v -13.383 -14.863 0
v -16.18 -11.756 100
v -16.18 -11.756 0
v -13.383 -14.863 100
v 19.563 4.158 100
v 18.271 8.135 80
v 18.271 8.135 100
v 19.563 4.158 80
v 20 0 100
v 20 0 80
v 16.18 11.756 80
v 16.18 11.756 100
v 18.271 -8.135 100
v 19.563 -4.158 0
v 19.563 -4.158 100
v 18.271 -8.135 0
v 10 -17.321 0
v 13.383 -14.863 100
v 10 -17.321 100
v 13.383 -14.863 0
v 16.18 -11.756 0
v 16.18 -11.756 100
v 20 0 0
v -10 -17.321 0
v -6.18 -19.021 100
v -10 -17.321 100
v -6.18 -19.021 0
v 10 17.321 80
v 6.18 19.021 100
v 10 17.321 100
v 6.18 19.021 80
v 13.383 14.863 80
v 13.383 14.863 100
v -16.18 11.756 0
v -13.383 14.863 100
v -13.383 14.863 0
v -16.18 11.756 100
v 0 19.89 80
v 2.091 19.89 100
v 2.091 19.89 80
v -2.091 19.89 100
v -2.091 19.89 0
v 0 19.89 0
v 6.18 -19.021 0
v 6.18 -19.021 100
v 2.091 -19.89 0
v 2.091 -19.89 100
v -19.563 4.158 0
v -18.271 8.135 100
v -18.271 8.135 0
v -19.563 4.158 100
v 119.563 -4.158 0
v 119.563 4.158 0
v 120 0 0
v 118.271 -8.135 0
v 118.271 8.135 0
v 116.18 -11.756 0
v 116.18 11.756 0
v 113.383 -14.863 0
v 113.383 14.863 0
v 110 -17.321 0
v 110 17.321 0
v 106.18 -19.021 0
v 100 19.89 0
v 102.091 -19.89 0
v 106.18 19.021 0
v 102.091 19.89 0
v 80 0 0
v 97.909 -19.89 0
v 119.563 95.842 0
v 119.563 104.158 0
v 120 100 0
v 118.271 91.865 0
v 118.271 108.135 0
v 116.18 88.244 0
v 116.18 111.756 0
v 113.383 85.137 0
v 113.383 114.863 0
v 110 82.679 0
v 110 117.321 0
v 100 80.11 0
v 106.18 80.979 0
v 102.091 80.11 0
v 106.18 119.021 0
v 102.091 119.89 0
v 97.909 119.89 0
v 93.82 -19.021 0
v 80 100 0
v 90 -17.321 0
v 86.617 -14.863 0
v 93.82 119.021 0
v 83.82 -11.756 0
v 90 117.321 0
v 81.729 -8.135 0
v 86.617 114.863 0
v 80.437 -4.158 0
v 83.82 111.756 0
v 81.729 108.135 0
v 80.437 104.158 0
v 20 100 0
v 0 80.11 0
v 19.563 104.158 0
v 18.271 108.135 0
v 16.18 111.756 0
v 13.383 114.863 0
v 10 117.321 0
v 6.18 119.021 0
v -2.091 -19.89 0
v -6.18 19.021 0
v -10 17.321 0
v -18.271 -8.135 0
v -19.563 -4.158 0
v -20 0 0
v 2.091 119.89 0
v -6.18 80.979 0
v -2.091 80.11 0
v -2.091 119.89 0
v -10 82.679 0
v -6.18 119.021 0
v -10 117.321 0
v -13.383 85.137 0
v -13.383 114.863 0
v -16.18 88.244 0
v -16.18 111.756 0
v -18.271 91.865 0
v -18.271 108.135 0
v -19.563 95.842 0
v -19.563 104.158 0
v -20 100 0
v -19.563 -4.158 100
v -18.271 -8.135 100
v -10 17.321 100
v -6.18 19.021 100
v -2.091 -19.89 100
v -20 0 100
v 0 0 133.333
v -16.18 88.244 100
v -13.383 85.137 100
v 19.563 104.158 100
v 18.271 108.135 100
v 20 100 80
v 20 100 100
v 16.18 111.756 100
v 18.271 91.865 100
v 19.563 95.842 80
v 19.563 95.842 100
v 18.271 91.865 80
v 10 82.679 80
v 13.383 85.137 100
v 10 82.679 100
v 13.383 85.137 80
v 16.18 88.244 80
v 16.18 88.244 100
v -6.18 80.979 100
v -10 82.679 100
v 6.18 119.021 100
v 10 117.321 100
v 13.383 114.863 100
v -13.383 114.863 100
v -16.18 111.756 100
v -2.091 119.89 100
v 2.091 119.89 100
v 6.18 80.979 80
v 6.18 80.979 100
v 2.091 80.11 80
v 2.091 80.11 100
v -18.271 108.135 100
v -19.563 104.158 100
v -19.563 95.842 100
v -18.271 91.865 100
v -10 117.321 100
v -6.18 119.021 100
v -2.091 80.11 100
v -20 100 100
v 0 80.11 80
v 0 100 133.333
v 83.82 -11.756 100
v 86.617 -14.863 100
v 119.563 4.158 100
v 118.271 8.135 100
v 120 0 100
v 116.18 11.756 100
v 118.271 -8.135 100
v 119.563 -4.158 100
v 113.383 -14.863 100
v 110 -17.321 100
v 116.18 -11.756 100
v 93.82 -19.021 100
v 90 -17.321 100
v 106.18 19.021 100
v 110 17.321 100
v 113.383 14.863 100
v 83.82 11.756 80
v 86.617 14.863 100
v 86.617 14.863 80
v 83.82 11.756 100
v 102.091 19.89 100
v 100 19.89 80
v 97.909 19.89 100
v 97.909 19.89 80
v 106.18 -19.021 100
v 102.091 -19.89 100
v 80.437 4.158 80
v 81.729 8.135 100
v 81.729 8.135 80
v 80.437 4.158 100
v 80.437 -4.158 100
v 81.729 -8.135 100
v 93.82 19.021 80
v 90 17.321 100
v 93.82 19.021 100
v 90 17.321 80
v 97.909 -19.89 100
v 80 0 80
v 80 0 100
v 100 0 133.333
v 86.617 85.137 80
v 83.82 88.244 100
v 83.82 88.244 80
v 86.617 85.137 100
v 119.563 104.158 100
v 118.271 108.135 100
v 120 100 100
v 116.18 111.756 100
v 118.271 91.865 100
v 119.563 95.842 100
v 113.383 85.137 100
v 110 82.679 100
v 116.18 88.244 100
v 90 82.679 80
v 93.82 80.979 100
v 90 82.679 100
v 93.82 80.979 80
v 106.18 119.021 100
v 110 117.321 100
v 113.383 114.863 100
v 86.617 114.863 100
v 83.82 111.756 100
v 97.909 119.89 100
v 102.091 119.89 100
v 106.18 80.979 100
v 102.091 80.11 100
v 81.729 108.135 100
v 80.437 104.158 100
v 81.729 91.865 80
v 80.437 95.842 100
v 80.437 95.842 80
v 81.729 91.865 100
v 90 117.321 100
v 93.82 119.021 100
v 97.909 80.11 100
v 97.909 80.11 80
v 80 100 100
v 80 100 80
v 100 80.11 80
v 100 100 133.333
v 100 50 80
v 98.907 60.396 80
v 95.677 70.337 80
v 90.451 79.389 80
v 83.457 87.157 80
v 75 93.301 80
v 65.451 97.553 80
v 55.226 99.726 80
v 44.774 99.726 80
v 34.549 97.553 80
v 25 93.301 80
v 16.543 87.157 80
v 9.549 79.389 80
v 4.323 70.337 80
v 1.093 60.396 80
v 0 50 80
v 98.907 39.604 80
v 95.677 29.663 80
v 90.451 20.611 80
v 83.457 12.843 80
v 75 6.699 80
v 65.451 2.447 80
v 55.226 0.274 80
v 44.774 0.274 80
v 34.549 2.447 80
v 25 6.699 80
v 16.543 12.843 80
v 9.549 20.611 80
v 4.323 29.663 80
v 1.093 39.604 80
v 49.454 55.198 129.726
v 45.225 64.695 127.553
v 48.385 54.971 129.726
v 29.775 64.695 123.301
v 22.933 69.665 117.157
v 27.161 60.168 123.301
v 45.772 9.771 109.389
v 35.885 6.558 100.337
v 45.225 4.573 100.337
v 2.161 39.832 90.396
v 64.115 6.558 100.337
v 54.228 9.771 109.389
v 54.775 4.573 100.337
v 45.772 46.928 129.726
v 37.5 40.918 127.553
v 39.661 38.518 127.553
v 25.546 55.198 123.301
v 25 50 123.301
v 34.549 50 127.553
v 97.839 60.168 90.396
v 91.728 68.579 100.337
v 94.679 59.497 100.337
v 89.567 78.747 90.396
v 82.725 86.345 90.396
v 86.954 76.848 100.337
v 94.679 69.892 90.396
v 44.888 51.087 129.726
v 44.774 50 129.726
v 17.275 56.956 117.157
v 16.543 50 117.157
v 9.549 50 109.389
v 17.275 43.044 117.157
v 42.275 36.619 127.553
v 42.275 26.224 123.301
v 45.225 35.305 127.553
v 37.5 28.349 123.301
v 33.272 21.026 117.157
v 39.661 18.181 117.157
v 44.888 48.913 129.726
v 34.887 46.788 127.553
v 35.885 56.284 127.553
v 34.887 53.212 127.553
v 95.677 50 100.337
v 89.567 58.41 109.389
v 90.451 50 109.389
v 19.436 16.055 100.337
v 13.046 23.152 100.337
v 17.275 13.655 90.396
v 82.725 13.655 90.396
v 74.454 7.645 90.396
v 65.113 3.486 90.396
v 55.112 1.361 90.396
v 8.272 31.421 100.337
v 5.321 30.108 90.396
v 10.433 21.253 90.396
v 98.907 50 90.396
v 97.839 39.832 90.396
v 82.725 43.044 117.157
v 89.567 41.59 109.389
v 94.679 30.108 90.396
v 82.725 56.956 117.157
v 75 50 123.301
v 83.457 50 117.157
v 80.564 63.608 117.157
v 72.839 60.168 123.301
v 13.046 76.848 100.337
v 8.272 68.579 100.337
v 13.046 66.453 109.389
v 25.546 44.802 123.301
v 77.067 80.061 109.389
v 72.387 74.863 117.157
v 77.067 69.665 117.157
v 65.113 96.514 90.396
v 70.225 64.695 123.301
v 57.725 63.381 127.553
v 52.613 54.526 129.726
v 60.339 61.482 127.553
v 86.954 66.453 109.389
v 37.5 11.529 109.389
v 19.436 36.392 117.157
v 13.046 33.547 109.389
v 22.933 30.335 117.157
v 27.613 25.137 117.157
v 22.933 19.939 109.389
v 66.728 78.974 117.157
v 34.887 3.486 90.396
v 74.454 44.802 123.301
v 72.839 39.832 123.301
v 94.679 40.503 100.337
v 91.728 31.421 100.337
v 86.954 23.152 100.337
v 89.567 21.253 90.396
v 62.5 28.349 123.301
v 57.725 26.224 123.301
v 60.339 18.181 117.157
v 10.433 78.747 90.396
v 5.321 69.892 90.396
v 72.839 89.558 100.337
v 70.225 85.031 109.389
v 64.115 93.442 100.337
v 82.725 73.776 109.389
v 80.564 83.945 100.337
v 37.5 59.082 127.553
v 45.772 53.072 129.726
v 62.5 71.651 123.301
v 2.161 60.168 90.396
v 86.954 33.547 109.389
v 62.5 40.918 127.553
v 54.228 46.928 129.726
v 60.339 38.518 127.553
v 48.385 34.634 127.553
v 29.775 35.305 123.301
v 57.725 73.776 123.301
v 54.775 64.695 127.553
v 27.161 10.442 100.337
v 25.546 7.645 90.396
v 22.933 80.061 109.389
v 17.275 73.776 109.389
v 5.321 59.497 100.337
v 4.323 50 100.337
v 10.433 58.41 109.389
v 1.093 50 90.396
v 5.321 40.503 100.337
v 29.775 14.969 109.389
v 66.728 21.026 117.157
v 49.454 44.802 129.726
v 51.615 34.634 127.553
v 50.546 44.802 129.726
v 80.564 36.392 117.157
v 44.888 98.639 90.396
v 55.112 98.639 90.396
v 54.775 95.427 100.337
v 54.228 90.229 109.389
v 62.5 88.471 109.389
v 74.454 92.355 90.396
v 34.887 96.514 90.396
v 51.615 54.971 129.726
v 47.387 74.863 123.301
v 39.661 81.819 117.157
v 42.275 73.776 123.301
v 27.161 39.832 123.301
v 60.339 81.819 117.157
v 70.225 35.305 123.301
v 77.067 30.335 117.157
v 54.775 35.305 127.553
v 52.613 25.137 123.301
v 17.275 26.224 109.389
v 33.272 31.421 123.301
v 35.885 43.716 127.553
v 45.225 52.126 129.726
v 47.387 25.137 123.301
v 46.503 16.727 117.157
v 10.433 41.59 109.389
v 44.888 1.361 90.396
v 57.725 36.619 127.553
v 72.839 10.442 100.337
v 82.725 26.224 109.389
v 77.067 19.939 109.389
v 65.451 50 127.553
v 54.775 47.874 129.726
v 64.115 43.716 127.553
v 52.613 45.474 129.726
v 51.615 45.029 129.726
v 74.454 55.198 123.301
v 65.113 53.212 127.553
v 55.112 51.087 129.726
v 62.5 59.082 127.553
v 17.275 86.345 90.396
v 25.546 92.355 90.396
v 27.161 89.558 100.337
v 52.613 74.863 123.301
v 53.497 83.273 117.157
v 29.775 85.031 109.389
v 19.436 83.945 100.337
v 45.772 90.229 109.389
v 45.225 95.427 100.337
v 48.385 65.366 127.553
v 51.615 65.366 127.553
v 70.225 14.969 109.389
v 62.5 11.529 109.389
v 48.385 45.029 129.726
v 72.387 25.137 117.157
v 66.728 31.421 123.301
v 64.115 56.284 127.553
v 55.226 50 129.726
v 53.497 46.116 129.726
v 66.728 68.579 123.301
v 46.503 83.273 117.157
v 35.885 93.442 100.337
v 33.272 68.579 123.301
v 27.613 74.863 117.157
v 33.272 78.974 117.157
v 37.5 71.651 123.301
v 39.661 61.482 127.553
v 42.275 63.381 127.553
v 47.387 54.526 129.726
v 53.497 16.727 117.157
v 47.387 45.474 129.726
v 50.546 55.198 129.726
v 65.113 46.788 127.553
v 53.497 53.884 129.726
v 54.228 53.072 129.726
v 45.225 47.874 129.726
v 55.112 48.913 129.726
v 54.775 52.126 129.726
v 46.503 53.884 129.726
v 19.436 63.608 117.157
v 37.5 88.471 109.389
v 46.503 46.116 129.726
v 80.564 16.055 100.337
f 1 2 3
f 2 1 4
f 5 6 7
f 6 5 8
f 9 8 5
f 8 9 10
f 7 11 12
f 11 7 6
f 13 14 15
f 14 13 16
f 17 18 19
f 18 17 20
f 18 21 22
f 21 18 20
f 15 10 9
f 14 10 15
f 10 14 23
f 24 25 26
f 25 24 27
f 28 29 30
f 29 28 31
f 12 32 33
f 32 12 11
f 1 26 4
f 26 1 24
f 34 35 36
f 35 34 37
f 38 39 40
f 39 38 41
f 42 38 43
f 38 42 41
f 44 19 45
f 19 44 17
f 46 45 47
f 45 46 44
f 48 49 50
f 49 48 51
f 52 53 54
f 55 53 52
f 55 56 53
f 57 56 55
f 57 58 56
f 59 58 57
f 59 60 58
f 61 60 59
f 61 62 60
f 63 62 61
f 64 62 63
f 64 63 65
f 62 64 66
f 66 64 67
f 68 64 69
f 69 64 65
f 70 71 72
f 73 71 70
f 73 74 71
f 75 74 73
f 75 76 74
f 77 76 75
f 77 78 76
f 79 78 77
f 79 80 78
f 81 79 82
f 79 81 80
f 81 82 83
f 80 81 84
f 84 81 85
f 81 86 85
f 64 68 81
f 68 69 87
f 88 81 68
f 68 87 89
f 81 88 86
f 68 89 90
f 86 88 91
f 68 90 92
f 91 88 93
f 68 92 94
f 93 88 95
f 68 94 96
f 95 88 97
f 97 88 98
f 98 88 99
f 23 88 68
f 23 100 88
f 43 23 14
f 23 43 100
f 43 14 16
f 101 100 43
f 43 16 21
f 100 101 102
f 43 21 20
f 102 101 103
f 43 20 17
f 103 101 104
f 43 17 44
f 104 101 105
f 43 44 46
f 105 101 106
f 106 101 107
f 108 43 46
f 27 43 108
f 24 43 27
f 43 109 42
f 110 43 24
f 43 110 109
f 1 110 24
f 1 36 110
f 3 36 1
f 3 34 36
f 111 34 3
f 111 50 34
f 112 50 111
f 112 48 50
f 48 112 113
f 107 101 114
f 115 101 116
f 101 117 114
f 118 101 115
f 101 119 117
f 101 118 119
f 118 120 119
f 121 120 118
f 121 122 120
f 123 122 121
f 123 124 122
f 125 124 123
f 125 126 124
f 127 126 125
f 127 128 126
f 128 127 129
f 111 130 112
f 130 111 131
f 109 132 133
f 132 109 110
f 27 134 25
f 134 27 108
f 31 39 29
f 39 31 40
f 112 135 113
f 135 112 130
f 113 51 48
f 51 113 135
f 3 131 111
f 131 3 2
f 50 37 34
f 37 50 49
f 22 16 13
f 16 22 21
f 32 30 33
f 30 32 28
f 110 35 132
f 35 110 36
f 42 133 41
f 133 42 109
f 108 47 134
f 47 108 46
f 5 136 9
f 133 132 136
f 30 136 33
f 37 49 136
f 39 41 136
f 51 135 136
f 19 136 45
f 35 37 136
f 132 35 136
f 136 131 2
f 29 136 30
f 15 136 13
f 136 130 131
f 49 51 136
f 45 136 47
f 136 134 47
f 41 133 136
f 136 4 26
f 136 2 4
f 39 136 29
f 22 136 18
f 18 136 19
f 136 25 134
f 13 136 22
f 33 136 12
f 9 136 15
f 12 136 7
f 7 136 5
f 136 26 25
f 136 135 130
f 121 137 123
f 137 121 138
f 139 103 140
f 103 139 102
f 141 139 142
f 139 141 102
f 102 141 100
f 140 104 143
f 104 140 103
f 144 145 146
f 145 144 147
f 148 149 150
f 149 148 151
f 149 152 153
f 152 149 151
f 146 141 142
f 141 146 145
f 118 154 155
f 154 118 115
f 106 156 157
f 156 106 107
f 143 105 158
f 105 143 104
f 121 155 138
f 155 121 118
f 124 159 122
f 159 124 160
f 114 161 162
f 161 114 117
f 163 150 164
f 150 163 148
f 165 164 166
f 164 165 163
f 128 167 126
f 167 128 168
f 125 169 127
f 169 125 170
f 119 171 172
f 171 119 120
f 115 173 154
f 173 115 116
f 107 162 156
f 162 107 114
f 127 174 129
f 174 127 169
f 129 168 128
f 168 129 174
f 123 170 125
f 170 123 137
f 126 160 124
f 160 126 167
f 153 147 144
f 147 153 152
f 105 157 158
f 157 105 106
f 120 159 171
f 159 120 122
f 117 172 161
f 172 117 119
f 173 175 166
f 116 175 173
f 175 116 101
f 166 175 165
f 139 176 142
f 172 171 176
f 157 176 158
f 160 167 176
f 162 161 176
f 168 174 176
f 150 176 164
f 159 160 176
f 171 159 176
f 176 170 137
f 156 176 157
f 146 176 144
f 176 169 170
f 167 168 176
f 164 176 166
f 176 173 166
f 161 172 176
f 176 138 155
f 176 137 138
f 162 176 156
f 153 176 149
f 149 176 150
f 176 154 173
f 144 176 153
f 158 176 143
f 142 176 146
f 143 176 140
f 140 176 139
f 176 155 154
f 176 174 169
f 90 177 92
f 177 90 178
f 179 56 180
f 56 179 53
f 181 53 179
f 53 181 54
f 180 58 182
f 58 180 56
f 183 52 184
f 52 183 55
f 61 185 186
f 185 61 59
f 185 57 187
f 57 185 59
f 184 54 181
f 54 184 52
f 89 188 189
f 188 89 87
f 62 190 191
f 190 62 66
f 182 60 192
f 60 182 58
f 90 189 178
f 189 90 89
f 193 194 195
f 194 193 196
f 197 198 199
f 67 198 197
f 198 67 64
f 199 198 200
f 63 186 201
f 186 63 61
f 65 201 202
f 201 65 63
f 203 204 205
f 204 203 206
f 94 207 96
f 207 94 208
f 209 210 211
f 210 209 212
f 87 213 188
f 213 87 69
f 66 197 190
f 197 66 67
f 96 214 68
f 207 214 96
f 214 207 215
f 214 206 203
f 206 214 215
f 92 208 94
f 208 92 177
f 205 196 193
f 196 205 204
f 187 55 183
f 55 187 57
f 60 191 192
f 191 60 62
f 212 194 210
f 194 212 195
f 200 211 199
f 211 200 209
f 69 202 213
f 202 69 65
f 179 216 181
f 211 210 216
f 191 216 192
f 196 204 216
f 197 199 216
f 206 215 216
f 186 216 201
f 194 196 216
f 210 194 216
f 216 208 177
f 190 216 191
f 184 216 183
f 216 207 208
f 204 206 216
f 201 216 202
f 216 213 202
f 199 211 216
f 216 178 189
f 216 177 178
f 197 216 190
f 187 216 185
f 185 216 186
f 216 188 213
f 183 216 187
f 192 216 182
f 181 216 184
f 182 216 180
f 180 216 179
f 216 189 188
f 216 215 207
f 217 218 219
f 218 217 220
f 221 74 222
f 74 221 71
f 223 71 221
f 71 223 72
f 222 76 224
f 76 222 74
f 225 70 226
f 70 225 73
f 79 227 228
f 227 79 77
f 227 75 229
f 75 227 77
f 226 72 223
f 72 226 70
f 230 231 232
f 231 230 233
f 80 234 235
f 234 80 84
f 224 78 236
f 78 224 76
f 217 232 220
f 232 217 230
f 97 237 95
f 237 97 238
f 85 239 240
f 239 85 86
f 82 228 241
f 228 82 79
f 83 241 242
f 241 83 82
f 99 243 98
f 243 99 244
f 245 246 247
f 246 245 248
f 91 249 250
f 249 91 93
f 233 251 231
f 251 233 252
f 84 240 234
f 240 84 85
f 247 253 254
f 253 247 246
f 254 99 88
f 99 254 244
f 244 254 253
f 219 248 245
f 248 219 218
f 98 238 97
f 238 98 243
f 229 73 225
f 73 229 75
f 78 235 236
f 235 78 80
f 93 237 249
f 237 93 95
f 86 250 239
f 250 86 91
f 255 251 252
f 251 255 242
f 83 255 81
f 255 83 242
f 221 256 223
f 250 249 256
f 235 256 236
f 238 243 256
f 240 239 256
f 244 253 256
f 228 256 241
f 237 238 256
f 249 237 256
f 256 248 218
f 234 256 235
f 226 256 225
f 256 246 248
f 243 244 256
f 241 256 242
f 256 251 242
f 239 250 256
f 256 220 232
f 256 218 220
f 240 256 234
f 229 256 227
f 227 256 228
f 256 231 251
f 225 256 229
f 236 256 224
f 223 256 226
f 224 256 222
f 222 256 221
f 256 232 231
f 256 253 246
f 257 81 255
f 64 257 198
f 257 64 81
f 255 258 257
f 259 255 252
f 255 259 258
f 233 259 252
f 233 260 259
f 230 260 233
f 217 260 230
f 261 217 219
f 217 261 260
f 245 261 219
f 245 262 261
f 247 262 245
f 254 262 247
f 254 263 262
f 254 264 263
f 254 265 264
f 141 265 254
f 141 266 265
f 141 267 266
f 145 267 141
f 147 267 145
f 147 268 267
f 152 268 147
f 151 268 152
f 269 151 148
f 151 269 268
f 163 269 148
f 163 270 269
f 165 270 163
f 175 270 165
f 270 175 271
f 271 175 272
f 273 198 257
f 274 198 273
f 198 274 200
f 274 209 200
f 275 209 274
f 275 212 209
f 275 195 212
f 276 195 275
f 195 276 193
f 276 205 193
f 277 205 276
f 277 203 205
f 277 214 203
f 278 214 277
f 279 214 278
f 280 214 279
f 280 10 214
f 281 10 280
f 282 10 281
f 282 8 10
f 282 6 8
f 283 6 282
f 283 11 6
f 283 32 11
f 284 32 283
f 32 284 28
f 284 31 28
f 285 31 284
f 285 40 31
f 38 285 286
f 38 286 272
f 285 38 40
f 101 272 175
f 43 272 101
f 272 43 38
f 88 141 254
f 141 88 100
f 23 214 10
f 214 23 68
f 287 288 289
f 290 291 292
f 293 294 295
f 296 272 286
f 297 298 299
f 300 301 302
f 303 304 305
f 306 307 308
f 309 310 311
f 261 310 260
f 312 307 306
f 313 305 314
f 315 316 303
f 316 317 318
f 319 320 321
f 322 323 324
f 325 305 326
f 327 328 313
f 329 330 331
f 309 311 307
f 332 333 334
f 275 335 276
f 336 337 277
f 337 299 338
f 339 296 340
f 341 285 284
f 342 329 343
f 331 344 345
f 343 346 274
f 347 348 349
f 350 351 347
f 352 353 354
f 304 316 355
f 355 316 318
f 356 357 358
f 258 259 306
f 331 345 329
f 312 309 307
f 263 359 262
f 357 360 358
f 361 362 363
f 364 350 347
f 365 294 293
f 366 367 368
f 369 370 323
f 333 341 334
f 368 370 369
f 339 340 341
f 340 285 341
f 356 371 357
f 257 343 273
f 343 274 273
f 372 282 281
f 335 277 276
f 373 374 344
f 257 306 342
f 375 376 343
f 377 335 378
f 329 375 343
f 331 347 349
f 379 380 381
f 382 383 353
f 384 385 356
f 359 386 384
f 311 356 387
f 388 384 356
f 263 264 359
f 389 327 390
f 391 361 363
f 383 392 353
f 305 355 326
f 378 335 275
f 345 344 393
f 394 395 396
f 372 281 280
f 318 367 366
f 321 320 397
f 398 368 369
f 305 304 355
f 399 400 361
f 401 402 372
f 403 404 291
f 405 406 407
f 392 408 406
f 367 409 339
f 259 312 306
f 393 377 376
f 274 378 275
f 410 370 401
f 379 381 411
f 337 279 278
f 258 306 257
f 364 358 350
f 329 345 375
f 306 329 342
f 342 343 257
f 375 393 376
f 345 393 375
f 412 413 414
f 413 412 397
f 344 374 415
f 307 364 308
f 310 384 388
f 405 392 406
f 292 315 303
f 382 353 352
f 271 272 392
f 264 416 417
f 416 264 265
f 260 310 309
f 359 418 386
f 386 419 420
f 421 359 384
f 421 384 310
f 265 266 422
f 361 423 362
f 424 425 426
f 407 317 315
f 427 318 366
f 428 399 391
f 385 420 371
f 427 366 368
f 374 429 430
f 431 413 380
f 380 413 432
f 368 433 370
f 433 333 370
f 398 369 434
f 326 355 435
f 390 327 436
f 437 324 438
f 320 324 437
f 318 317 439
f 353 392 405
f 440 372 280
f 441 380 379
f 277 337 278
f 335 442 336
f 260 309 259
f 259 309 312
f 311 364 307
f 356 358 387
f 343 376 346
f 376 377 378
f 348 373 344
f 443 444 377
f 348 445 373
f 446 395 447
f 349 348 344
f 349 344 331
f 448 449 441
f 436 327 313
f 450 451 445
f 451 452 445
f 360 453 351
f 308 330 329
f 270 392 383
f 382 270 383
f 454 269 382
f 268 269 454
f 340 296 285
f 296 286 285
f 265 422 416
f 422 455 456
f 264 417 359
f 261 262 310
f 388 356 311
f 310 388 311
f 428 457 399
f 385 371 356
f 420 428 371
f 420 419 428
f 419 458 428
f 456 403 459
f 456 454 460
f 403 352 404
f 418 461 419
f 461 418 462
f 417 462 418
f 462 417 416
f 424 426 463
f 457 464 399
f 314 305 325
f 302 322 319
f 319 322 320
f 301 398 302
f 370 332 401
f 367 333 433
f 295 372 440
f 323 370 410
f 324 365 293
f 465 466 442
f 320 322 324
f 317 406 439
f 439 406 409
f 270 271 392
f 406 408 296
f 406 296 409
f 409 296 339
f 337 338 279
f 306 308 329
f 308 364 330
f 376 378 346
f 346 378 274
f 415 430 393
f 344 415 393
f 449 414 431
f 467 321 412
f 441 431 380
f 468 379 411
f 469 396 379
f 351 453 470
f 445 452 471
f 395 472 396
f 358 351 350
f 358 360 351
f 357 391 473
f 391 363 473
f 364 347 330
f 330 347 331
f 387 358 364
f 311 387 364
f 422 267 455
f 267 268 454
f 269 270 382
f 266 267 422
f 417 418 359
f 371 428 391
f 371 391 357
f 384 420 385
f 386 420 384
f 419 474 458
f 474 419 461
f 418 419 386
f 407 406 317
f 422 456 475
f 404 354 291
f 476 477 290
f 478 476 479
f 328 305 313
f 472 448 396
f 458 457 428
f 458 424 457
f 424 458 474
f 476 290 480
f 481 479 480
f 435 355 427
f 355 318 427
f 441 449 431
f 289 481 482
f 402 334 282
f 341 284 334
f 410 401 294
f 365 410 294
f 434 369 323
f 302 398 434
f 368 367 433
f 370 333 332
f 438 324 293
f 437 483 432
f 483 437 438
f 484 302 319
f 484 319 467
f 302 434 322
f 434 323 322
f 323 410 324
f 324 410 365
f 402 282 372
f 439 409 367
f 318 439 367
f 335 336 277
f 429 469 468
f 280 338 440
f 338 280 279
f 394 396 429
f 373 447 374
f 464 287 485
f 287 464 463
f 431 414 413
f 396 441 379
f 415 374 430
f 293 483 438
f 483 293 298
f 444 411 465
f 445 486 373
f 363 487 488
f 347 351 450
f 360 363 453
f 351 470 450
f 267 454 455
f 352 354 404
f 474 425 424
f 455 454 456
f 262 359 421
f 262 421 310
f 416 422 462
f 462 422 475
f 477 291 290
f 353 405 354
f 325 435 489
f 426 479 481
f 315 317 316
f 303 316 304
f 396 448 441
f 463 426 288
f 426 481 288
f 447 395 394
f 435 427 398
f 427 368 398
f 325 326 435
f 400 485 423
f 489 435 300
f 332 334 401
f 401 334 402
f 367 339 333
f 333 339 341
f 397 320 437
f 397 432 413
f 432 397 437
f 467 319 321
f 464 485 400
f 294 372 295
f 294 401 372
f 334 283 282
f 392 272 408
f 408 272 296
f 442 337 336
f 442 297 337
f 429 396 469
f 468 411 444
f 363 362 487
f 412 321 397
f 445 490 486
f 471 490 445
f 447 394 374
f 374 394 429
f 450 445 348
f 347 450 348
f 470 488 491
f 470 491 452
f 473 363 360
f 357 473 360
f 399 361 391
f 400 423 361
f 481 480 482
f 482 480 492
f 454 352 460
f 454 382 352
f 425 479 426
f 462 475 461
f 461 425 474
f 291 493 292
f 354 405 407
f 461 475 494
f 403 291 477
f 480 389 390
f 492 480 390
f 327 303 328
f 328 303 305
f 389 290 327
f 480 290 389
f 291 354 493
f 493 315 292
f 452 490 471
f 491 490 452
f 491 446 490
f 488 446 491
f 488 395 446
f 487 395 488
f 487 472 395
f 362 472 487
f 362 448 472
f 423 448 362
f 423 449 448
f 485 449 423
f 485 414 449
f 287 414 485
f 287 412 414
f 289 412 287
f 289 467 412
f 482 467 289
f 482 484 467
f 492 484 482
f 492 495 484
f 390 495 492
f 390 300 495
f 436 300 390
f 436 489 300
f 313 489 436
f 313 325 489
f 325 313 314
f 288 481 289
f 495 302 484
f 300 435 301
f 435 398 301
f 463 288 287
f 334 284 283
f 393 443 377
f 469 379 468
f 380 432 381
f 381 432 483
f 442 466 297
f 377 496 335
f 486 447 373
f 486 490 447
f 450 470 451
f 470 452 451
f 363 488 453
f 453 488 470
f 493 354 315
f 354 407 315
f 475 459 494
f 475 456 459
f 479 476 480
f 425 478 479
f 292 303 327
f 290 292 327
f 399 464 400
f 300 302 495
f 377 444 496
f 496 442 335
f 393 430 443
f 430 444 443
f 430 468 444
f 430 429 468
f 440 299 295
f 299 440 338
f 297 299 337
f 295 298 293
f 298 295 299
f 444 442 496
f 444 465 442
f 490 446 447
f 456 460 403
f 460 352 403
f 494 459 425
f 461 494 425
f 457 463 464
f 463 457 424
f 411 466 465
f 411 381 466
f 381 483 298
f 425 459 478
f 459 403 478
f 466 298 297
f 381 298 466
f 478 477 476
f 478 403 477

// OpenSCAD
// torre con alto y ancho
module torre(alto,diametro){
	cylinder(h = alto, r=diametro/2);
	translate([0,0,alto])cylinder(h = alto/3, r1 = diametro/2, r2 = 0, center = false);
}

for ( i = [0 : 1] )
{
	for (j= [0:1])
	{
		translate([i*100,j*100,0])torre(100,40);
	}
}

cube(size=[100,100,80]);
translate([50,50,80])sphere(r=50);
